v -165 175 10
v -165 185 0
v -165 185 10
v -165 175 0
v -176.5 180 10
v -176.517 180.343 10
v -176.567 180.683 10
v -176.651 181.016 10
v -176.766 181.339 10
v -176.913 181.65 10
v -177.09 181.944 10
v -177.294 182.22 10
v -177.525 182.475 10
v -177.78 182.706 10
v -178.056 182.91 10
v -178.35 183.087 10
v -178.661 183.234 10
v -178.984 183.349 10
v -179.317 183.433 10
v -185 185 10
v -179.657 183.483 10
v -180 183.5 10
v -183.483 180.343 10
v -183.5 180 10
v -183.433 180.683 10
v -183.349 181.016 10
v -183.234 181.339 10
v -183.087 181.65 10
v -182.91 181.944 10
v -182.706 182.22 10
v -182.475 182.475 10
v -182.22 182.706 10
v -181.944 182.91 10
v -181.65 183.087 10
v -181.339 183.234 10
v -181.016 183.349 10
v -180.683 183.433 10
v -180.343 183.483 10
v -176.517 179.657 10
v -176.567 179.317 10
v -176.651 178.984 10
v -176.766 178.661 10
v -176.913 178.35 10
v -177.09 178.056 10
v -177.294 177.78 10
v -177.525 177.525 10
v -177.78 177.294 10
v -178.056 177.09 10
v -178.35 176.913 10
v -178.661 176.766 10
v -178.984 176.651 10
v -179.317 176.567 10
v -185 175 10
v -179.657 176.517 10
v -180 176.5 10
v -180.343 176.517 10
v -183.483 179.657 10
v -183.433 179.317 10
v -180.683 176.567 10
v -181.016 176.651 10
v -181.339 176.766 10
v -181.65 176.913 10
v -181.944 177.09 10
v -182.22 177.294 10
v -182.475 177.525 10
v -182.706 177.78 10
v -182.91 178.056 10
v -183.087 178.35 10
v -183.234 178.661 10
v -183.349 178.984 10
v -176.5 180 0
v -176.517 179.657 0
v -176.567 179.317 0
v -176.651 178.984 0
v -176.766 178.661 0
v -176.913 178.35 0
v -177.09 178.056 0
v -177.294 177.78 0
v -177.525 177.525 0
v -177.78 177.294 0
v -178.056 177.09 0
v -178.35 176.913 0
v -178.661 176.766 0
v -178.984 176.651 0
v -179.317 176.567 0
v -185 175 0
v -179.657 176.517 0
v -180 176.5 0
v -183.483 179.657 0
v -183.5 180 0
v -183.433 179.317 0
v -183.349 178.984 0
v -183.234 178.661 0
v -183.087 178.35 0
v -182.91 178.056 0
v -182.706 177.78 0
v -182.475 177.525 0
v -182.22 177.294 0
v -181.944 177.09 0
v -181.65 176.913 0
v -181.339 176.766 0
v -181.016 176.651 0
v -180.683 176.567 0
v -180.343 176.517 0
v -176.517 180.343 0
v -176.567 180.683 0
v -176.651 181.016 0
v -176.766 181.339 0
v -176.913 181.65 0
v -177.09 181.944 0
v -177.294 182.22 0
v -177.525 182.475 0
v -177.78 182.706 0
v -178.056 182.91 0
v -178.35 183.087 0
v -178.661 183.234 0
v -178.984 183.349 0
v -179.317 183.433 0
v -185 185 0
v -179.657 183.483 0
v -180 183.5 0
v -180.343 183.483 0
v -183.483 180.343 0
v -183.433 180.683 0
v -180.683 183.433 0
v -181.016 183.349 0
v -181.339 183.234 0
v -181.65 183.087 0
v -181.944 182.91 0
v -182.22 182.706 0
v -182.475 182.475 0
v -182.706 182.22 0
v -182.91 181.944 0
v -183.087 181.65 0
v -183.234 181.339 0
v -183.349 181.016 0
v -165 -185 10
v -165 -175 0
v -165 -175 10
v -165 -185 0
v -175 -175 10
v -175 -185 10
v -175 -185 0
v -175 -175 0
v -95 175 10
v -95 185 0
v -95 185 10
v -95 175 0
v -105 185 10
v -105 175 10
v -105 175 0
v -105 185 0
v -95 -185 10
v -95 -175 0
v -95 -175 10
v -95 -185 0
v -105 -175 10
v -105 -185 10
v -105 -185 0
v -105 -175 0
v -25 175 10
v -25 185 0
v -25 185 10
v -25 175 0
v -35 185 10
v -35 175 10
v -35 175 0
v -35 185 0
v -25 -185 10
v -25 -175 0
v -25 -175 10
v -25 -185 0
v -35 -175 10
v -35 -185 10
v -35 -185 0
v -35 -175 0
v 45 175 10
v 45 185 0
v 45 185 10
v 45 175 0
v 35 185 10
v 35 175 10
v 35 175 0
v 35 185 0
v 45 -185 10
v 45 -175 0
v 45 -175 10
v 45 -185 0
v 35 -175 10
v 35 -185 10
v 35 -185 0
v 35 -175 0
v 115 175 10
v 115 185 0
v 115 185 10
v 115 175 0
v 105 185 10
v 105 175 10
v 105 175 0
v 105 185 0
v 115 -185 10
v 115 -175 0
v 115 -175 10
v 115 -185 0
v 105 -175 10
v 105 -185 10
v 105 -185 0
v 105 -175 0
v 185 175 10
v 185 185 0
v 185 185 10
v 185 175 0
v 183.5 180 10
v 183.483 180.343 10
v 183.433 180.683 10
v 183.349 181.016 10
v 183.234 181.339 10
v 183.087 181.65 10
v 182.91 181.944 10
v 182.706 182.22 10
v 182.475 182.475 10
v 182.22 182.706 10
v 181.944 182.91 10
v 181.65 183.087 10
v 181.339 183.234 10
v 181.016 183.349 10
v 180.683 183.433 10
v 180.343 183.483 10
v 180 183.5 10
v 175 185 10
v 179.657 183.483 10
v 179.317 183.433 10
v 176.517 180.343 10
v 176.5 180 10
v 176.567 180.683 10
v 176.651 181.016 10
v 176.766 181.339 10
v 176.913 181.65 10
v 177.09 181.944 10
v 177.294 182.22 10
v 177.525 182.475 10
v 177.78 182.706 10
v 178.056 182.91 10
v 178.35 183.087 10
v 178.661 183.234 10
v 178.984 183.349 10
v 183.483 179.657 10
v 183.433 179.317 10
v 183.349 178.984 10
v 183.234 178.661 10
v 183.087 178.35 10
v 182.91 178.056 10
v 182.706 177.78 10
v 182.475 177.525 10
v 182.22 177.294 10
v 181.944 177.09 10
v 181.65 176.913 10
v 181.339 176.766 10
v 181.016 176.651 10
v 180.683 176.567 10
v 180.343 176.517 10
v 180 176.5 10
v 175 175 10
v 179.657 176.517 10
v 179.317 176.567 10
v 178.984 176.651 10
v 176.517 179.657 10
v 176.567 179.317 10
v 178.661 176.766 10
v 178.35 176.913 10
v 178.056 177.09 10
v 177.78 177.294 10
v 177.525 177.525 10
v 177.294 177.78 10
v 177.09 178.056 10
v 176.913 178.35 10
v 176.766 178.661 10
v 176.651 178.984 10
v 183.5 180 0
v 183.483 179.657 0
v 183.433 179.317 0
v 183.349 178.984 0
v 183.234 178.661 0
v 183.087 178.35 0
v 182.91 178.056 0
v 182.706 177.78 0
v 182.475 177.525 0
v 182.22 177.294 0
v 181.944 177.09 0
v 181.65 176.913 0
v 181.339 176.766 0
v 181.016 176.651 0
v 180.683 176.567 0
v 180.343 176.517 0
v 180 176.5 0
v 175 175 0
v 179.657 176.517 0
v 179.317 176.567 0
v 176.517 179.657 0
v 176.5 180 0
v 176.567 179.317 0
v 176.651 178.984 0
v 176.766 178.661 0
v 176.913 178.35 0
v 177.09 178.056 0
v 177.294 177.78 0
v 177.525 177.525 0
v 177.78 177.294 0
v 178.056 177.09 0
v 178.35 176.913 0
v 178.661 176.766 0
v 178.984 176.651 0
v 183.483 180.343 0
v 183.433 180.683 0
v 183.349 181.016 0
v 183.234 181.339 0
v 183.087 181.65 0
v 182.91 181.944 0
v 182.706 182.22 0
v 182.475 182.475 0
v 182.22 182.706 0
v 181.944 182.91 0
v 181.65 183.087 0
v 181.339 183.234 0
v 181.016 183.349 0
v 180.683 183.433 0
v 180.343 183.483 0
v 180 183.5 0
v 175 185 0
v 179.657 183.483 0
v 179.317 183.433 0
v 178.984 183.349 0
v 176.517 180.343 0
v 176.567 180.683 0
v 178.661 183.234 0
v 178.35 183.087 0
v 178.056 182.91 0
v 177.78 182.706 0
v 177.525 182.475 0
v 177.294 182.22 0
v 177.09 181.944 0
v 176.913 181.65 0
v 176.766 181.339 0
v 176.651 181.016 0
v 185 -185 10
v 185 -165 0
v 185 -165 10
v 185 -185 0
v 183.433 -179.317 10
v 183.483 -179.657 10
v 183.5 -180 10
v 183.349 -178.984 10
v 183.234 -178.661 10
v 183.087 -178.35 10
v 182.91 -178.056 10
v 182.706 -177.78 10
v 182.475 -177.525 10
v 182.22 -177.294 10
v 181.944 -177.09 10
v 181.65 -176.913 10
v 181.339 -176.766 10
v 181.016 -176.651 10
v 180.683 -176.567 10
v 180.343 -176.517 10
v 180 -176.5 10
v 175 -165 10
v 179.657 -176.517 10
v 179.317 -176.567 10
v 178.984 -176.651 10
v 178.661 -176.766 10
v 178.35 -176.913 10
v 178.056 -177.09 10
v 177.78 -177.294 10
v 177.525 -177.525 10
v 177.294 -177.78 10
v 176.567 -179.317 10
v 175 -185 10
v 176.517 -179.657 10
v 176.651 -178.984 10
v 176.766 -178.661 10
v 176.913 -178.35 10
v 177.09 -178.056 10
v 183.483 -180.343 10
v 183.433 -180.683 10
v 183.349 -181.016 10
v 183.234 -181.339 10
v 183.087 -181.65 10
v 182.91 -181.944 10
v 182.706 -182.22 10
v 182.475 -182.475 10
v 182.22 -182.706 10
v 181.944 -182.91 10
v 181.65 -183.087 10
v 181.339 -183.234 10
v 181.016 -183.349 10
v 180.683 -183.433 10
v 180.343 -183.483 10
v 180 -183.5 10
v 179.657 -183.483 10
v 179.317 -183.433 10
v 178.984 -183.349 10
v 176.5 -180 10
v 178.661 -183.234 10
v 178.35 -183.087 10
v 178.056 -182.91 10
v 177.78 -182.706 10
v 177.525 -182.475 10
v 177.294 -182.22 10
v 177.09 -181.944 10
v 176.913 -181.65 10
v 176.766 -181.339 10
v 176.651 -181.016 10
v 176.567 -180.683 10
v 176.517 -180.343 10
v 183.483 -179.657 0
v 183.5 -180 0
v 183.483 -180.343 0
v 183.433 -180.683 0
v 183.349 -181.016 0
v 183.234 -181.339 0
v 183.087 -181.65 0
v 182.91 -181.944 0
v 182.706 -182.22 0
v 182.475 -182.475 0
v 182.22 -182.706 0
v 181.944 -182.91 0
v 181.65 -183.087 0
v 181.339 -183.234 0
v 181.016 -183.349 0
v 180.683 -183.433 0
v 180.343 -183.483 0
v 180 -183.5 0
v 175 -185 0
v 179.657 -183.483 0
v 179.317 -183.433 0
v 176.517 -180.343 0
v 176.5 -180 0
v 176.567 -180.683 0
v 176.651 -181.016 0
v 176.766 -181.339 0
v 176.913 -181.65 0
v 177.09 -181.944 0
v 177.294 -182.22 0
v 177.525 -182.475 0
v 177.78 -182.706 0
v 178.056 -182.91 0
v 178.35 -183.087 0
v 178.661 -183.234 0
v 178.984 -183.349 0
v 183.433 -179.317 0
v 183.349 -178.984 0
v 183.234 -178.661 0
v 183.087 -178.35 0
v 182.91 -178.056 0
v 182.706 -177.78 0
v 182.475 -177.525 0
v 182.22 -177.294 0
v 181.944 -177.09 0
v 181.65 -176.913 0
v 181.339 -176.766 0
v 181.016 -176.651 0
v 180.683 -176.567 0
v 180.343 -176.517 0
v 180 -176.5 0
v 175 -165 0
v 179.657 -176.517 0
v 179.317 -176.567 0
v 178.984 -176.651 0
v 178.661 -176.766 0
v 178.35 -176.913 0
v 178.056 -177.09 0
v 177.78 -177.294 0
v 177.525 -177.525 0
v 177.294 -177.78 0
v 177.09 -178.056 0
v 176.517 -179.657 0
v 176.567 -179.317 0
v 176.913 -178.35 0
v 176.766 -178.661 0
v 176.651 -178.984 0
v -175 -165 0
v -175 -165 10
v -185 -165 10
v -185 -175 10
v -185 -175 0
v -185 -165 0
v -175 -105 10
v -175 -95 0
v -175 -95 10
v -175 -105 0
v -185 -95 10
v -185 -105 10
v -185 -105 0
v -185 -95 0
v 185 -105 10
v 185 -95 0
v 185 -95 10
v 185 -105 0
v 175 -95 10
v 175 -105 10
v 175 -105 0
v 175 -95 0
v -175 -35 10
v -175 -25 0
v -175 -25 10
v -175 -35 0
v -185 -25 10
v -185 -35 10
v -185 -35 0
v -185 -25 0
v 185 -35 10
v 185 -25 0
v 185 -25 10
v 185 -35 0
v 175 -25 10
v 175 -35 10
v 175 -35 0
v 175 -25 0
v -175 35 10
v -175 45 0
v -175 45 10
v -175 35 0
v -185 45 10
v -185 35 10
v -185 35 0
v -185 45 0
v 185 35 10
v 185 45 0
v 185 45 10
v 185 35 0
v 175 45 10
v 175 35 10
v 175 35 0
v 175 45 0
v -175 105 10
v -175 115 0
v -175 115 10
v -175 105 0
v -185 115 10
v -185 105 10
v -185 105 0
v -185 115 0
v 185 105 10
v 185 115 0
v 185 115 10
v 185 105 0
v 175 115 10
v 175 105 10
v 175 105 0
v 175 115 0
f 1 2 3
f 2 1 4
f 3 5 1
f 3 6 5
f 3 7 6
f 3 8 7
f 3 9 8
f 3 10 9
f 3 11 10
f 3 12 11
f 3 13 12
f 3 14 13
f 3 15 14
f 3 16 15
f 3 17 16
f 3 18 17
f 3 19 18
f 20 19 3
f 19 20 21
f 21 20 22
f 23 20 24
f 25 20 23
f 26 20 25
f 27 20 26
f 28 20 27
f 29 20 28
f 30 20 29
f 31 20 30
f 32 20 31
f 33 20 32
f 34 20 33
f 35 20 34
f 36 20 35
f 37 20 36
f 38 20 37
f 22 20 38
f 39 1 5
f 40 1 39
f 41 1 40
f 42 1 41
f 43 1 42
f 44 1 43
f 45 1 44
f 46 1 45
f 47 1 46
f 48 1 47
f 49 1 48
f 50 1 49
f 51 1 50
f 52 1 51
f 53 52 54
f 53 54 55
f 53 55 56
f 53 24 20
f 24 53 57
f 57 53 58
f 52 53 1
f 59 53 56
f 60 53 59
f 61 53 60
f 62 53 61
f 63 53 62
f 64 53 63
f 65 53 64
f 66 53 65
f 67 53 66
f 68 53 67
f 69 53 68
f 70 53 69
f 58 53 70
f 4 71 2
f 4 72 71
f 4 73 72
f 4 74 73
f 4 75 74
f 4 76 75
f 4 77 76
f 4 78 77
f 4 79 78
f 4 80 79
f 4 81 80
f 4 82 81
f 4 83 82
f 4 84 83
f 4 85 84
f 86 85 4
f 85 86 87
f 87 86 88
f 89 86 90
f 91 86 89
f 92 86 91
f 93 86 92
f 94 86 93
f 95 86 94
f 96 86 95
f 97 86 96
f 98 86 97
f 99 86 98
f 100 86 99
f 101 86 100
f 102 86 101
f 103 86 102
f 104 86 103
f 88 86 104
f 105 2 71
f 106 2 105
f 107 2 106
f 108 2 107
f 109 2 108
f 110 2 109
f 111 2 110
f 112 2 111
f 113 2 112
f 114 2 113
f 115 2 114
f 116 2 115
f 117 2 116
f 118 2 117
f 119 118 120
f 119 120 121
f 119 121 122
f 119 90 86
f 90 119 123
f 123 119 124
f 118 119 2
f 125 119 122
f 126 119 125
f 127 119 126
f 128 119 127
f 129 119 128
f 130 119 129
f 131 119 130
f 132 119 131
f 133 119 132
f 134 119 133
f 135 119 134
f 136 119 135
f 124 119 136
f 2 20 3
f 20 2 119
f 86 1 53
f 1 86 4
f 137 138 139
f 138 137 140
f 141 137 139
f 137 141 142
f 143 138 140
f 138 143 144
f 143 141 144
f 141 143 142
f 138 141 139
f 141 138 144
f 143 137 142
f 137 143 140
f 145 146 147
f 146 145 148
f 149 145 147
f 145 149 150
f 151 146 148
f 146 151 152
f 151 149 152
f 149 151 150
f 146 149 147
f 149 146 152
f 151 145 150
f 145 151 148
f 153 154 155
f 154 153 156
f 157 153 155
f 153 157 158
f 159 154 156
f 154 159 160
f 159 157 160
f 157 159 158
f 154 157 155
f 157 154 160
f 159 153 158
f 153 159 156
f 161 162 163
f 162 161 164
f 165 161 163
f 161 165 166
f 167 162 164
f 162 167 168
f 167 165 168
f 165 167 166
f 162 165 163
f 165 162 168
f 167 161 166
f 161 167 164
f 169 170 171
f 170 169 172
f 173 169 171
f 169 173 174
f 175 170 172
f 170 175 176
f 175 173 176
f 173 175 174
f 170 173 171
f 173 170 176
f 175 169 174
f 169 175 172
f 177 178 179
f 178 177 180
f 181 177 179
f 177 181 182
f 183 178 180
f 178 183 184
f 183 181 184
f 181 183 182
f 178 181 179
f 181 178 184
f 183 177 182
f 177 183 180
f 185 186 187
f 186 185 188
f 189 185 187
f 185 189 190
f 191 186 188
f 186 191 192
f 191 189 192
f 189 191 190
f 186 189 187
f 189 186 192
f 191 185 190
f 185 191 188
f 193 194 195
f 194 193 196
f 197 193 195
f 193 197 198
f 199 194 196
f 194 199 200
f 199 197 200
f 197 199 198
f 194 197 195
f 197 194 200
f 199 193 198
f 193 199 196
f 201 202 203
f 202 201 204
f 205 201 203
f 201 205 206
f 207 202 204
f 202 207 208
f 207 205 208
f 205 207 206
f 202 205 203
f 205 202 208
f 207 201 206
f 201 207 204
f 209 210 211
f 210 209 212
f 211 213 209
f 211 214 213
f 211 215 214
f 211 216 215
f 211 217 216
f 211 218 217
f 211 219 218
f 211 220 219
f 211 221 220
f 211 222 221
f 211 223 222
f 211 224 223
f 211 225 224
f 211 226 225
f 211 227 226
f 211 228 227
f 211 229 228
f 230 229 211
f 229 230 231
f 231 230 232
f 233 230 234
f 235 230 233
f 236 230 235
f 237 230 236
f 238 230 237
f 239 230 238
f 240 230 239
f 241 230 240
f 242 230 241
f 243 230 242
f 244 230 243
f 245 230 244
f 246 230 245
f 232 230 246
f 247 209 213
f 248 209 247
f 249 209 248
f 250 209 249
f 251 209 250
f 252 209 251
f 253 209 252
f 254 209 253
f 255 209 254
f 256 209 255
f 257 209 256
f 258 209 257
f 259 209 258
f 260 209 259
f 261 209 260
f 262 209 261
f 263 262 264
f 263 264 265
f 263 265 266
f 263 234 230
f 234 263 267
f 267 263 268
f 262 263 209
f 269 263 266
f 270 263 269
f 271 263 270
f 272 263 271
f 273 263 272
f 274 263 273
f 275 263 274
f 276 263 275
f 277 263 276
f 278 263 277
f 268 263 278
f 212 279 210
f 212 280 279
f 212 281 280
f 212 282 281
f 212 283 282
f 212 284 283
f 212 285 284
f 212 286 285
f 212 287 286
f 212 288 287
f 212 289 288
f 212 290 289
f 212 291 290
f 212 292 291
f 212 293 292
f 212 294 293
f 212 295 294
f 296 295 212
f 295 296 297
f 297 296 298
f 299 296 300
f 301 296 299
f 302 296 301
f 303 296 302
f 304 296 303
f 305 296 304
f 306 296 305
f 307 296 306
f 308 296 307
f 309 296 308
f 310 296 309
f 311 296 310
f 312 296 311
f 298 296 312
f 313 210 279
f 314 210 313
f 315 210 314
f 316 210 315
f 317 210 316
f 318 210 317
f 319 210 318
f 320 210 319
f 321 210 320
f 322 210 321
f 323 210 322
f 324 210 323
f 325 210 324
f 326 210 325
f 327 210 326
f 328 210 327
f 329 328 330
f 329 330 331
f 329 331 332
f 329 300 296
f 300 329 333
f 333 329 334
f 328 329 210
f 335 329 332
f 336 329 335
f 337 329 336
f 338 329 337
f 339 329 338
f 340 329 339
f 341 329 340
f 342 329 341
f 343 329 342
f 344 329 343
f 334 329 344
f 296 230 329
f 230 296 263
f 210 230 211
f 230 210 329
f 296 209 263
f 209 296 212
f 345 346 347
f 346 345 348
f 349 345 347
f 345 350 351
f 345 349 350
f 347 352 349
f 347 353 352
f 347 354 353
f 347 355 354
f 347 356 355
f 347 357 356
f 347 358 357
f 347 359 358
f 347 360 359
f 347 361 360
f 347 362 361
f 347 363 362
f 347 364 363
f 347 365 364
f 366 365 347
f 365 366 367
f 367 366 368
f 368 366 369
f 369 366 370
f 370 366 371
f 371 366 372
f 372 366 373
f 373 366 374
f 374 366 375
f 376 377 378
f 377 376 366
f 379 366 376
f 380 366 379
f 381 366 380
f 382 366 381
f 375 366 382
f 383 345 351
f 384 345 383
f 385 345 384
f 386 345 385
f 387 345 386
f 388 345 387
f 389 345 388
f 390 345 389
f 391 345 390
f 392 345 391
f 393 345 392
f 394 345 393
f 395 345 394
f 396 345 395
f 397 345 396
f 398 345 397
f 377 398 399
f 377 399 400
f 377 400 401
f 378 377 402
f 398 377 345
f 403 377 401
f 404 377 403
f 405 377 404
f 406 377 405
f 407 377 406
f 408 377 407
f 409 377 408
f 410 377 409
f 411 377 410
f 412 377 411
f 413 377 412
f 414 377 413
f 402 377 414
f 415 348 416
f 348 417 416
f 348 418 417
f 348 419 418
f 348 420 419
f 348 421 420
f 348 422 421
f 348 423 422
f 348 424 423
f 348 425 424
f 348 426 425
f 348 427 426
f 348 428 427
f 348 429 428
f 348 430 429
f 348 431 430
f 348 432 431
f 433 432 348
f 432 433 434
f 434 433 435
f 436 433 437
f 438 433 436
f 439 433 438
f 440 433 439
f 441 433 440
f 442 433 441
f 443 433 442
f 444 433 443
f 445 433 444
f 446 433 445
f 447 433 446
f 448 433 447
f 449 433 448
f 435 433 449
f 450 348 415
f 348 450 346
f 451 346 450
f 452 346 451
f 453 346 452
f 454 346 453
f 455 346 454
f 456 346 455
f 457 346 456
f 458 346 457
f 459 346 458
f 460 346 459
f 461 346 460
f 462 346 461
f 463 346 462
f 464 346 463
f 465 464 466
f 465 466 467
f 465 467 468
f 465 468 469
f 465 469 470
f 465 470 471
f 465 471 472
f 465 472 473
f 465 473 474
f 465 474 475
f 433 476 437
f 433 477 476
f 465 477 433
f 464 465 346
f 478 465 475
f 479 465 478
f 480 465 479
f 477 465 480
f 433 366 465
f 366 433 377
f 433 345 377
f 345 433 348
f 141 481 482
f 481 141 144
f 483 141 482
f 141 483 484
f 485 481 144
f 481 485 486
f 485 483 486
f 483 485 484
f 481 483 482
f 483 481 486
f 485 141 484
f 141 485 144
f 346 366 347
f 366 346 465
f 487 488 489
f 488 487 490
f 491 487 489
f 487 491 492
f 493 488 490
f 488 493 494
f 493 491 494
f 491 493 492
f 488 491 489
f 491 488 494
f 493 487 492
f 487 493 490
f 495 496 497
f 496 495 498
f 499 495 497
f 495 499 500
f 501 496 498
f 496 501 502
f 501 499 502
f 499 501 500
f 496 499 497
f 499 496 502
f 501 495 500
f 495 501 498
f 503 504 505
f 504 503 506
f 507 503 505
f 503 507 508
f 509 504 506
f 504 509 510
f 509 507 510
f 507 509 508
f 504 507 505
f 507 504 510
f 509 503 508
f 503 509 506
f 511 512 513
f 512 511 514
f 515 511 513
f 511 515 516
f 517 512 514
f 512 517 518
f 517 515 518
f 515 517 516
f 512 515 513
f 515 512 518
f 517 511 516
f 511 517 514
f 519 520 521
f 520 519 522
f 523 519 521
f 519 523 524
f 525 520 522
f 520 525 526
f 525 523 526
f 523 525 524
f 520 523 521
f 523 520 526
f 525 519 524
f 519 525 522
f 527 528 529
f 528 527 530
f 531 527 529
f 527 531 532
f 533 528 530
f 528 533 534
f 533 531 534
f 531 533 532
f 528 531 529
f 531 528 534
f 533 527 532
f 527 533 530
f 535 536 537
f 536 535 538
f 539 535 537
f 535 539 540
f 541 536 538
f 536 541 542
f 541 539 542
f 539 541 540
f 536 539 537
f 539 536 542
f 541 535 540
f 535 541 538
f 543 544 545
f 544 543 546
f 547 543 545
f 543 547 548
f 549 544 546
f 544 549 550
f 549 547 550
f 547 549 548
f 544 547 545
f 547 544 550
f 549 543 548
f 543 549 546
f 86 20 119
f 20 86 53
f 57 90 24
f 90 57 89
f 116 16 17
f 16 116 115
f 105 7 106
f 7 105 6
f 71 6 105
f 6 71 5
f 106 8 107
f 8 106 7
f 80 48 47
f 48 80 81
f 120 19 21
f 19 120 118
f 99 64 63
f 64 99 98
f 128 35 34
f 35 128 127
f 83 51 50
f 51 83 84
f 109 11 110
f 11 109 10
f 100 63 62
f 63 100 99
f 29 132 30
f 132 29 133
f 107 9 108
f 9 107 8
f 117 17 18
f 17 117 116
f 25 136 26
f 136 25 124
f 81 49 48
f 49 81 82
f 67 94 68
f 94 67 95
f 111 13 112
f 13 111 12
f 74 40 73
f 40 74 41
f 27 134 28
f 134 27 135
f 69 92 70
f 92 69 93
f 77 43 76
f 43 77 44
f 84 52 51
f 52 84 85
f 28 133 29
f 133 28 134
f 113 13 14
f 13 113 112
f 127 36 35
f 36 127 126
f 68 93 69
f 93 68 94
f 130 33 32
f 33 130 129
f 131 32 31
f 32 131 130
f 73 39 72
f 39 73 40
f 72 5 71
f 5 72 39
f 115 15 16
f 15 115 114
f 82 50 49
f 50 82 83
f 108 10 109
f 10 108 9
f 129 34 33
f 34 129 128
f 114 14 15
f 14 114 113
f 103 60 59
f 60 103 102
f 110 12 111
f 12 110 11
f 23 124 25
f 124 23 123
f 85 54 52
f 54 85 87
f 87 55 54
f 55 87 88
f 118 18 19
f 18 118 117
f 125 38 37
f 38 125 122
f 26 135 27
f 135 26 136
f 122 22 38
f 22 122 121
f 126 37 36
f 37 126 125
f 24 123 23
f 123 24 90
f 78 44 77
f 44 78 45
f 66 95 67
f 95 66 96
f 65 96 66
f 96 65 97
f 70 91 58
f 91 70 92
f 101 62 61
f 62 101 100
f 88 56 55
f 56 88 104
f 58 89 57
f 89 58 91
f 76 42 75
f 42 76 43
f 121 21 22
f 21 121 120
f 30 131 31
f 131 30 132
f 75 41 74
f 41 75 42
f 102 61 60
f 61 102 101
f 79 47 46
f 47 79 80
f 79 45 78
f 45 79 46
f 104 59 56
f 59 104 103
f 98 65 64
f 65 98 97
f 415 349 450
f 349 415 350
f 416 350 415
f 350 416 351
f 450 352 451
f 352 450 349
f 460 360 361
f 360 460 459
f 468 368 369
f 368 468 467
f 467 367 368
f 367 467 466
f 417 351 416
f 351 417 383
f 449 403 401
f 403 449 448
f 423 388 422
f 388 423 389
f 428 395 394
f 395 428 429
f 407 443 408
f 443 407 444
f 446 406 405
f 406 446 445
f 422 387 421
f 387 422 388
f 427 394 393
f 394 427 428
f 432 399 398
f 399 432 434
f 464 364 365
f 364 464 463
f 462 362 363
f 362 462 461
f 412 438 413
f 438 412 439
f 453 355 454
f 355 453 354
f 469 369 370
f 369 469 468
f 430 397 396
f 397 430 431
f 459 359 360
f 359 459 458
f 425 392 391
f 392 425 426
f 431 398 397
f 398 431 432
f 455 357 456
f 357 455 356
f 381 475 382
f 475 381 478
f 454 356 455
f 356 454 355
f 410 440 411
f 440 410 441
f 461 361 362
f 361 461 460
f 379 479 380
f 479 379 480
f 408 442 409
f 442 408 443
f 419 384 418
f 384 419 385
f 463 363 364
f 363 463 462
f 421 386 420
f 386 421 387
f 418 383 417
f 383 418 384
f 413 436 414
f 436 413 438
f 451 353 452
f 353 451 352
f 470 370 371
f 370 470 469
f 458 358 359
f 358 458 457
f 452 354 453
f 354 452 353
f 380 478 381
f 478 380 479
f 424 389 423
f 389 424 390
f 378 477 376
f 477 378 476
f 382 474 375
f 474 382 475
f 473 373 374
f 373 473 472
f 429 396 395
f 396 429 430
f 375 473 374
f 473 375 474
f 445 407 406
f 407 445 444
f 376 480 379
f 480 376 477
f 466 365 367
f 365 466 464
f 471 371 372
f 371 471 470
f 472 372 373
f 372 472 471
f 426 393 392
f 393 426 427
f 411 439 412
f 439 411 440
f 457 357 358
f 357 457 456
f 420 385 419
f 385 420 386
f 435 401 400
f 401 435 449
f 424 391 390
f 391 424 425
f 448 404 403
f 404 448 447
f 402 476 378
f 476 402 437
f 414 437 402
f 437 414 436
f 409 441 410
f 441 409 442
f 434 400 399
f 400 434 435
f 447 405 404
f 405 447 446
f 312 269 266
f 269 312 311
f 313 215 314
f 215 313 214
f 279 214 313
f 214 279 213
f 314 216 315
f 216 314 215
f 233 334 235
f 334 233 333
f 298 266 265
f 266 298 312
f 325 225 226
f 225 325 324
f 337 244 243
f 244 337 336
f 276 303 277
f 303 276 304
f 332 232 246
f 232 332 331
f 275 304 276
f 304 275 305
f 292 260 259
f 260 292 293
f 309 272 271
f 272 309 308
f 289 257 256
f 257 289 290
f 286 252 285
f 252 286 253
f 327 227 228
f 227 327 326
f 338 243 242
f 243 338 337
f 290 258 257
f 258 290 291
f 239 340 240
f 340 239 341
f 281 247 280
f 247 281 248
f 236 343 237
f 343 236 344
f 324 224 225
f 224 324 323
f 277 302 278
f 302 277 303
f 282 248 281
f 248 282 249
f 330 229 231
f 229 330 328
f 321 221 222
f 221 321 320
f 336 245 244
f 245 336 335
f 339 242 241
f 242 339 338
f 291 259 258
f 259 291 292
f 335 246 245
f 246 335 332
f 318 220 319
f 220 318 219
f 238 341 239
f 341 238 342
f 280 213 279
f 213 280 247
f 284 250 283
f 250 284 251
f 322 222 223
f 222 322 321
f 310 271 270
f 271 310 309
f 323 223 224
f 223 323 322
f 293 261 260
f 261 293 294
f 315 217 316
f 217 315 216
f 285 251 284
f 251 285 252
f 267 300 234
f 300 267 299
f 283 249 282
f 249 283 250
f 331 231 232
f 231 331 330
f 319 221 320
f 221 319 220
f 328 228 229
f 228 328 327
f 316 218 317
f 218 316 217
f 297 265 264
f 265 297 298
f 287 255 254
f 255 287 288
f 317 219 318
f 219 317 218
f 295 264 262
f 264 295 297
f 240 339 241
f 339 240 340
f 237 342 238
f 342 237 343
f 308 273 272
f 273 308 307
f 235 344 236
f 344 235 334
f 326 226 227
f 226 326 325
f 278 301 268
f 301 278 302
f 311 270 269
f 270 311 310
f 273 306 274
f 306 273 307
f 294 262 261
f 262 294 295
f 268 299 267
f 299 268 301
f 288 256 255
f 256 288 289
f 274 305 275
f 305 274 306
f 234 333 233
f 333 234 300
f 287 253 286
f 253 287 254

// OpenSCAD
// ring_26.scad - ring index 26 (z bottom = 260 mm)
$fn = 64; bar = 10; half_b = bar/2; outer = 370; half_outer = outer/2;
front_y = 180; back_y = -180; left_x = -180; right_x = 180;
x_centers = [-170, -100, -30, 40, 110, 180];
z_centers = [5, 85, 155, 225, 295, 365, 435, 505, 575, 645, 715]; ring_z = 260;
module place_box(cx, cy, sx, sy) { translate([cx - sx/2, cy - sy/2, 0]) cube([sx, sy, bar]); }

difference() { union() {
    for (x = x_centers) { place_box(x, front_y, bar, bar); place_box(x, back_y, bar, bar); }
    for (y = x_centers) { place_box(left_x, y, bar, bar); place_box(right_x, y, bar, bar); }
    for (zc = z_centers) if ((zc - half_b < ring_z + bar) && (zc + half_b > ring_z)) {
        translate([-half_outer, front_y - half_b, 0]) cube([outer, bar, bar]);
        translate([-half_outer, back_y - half_b, 0])  cube([outer, bar, bar]);
        translate([left_x - half_b, -half_outer, 0])  cube([bar, outer, bar]);
        translate([right_x - half_b, -half_outer, 0]) cube([bar, outer, bar]);
    }
  }
  for (cx = [-180, 180]) for (cy = [-180, 180]) translate([cx, cy, 0]) cylinder(h = bar, r = 3.5, $fn = 64);
}
